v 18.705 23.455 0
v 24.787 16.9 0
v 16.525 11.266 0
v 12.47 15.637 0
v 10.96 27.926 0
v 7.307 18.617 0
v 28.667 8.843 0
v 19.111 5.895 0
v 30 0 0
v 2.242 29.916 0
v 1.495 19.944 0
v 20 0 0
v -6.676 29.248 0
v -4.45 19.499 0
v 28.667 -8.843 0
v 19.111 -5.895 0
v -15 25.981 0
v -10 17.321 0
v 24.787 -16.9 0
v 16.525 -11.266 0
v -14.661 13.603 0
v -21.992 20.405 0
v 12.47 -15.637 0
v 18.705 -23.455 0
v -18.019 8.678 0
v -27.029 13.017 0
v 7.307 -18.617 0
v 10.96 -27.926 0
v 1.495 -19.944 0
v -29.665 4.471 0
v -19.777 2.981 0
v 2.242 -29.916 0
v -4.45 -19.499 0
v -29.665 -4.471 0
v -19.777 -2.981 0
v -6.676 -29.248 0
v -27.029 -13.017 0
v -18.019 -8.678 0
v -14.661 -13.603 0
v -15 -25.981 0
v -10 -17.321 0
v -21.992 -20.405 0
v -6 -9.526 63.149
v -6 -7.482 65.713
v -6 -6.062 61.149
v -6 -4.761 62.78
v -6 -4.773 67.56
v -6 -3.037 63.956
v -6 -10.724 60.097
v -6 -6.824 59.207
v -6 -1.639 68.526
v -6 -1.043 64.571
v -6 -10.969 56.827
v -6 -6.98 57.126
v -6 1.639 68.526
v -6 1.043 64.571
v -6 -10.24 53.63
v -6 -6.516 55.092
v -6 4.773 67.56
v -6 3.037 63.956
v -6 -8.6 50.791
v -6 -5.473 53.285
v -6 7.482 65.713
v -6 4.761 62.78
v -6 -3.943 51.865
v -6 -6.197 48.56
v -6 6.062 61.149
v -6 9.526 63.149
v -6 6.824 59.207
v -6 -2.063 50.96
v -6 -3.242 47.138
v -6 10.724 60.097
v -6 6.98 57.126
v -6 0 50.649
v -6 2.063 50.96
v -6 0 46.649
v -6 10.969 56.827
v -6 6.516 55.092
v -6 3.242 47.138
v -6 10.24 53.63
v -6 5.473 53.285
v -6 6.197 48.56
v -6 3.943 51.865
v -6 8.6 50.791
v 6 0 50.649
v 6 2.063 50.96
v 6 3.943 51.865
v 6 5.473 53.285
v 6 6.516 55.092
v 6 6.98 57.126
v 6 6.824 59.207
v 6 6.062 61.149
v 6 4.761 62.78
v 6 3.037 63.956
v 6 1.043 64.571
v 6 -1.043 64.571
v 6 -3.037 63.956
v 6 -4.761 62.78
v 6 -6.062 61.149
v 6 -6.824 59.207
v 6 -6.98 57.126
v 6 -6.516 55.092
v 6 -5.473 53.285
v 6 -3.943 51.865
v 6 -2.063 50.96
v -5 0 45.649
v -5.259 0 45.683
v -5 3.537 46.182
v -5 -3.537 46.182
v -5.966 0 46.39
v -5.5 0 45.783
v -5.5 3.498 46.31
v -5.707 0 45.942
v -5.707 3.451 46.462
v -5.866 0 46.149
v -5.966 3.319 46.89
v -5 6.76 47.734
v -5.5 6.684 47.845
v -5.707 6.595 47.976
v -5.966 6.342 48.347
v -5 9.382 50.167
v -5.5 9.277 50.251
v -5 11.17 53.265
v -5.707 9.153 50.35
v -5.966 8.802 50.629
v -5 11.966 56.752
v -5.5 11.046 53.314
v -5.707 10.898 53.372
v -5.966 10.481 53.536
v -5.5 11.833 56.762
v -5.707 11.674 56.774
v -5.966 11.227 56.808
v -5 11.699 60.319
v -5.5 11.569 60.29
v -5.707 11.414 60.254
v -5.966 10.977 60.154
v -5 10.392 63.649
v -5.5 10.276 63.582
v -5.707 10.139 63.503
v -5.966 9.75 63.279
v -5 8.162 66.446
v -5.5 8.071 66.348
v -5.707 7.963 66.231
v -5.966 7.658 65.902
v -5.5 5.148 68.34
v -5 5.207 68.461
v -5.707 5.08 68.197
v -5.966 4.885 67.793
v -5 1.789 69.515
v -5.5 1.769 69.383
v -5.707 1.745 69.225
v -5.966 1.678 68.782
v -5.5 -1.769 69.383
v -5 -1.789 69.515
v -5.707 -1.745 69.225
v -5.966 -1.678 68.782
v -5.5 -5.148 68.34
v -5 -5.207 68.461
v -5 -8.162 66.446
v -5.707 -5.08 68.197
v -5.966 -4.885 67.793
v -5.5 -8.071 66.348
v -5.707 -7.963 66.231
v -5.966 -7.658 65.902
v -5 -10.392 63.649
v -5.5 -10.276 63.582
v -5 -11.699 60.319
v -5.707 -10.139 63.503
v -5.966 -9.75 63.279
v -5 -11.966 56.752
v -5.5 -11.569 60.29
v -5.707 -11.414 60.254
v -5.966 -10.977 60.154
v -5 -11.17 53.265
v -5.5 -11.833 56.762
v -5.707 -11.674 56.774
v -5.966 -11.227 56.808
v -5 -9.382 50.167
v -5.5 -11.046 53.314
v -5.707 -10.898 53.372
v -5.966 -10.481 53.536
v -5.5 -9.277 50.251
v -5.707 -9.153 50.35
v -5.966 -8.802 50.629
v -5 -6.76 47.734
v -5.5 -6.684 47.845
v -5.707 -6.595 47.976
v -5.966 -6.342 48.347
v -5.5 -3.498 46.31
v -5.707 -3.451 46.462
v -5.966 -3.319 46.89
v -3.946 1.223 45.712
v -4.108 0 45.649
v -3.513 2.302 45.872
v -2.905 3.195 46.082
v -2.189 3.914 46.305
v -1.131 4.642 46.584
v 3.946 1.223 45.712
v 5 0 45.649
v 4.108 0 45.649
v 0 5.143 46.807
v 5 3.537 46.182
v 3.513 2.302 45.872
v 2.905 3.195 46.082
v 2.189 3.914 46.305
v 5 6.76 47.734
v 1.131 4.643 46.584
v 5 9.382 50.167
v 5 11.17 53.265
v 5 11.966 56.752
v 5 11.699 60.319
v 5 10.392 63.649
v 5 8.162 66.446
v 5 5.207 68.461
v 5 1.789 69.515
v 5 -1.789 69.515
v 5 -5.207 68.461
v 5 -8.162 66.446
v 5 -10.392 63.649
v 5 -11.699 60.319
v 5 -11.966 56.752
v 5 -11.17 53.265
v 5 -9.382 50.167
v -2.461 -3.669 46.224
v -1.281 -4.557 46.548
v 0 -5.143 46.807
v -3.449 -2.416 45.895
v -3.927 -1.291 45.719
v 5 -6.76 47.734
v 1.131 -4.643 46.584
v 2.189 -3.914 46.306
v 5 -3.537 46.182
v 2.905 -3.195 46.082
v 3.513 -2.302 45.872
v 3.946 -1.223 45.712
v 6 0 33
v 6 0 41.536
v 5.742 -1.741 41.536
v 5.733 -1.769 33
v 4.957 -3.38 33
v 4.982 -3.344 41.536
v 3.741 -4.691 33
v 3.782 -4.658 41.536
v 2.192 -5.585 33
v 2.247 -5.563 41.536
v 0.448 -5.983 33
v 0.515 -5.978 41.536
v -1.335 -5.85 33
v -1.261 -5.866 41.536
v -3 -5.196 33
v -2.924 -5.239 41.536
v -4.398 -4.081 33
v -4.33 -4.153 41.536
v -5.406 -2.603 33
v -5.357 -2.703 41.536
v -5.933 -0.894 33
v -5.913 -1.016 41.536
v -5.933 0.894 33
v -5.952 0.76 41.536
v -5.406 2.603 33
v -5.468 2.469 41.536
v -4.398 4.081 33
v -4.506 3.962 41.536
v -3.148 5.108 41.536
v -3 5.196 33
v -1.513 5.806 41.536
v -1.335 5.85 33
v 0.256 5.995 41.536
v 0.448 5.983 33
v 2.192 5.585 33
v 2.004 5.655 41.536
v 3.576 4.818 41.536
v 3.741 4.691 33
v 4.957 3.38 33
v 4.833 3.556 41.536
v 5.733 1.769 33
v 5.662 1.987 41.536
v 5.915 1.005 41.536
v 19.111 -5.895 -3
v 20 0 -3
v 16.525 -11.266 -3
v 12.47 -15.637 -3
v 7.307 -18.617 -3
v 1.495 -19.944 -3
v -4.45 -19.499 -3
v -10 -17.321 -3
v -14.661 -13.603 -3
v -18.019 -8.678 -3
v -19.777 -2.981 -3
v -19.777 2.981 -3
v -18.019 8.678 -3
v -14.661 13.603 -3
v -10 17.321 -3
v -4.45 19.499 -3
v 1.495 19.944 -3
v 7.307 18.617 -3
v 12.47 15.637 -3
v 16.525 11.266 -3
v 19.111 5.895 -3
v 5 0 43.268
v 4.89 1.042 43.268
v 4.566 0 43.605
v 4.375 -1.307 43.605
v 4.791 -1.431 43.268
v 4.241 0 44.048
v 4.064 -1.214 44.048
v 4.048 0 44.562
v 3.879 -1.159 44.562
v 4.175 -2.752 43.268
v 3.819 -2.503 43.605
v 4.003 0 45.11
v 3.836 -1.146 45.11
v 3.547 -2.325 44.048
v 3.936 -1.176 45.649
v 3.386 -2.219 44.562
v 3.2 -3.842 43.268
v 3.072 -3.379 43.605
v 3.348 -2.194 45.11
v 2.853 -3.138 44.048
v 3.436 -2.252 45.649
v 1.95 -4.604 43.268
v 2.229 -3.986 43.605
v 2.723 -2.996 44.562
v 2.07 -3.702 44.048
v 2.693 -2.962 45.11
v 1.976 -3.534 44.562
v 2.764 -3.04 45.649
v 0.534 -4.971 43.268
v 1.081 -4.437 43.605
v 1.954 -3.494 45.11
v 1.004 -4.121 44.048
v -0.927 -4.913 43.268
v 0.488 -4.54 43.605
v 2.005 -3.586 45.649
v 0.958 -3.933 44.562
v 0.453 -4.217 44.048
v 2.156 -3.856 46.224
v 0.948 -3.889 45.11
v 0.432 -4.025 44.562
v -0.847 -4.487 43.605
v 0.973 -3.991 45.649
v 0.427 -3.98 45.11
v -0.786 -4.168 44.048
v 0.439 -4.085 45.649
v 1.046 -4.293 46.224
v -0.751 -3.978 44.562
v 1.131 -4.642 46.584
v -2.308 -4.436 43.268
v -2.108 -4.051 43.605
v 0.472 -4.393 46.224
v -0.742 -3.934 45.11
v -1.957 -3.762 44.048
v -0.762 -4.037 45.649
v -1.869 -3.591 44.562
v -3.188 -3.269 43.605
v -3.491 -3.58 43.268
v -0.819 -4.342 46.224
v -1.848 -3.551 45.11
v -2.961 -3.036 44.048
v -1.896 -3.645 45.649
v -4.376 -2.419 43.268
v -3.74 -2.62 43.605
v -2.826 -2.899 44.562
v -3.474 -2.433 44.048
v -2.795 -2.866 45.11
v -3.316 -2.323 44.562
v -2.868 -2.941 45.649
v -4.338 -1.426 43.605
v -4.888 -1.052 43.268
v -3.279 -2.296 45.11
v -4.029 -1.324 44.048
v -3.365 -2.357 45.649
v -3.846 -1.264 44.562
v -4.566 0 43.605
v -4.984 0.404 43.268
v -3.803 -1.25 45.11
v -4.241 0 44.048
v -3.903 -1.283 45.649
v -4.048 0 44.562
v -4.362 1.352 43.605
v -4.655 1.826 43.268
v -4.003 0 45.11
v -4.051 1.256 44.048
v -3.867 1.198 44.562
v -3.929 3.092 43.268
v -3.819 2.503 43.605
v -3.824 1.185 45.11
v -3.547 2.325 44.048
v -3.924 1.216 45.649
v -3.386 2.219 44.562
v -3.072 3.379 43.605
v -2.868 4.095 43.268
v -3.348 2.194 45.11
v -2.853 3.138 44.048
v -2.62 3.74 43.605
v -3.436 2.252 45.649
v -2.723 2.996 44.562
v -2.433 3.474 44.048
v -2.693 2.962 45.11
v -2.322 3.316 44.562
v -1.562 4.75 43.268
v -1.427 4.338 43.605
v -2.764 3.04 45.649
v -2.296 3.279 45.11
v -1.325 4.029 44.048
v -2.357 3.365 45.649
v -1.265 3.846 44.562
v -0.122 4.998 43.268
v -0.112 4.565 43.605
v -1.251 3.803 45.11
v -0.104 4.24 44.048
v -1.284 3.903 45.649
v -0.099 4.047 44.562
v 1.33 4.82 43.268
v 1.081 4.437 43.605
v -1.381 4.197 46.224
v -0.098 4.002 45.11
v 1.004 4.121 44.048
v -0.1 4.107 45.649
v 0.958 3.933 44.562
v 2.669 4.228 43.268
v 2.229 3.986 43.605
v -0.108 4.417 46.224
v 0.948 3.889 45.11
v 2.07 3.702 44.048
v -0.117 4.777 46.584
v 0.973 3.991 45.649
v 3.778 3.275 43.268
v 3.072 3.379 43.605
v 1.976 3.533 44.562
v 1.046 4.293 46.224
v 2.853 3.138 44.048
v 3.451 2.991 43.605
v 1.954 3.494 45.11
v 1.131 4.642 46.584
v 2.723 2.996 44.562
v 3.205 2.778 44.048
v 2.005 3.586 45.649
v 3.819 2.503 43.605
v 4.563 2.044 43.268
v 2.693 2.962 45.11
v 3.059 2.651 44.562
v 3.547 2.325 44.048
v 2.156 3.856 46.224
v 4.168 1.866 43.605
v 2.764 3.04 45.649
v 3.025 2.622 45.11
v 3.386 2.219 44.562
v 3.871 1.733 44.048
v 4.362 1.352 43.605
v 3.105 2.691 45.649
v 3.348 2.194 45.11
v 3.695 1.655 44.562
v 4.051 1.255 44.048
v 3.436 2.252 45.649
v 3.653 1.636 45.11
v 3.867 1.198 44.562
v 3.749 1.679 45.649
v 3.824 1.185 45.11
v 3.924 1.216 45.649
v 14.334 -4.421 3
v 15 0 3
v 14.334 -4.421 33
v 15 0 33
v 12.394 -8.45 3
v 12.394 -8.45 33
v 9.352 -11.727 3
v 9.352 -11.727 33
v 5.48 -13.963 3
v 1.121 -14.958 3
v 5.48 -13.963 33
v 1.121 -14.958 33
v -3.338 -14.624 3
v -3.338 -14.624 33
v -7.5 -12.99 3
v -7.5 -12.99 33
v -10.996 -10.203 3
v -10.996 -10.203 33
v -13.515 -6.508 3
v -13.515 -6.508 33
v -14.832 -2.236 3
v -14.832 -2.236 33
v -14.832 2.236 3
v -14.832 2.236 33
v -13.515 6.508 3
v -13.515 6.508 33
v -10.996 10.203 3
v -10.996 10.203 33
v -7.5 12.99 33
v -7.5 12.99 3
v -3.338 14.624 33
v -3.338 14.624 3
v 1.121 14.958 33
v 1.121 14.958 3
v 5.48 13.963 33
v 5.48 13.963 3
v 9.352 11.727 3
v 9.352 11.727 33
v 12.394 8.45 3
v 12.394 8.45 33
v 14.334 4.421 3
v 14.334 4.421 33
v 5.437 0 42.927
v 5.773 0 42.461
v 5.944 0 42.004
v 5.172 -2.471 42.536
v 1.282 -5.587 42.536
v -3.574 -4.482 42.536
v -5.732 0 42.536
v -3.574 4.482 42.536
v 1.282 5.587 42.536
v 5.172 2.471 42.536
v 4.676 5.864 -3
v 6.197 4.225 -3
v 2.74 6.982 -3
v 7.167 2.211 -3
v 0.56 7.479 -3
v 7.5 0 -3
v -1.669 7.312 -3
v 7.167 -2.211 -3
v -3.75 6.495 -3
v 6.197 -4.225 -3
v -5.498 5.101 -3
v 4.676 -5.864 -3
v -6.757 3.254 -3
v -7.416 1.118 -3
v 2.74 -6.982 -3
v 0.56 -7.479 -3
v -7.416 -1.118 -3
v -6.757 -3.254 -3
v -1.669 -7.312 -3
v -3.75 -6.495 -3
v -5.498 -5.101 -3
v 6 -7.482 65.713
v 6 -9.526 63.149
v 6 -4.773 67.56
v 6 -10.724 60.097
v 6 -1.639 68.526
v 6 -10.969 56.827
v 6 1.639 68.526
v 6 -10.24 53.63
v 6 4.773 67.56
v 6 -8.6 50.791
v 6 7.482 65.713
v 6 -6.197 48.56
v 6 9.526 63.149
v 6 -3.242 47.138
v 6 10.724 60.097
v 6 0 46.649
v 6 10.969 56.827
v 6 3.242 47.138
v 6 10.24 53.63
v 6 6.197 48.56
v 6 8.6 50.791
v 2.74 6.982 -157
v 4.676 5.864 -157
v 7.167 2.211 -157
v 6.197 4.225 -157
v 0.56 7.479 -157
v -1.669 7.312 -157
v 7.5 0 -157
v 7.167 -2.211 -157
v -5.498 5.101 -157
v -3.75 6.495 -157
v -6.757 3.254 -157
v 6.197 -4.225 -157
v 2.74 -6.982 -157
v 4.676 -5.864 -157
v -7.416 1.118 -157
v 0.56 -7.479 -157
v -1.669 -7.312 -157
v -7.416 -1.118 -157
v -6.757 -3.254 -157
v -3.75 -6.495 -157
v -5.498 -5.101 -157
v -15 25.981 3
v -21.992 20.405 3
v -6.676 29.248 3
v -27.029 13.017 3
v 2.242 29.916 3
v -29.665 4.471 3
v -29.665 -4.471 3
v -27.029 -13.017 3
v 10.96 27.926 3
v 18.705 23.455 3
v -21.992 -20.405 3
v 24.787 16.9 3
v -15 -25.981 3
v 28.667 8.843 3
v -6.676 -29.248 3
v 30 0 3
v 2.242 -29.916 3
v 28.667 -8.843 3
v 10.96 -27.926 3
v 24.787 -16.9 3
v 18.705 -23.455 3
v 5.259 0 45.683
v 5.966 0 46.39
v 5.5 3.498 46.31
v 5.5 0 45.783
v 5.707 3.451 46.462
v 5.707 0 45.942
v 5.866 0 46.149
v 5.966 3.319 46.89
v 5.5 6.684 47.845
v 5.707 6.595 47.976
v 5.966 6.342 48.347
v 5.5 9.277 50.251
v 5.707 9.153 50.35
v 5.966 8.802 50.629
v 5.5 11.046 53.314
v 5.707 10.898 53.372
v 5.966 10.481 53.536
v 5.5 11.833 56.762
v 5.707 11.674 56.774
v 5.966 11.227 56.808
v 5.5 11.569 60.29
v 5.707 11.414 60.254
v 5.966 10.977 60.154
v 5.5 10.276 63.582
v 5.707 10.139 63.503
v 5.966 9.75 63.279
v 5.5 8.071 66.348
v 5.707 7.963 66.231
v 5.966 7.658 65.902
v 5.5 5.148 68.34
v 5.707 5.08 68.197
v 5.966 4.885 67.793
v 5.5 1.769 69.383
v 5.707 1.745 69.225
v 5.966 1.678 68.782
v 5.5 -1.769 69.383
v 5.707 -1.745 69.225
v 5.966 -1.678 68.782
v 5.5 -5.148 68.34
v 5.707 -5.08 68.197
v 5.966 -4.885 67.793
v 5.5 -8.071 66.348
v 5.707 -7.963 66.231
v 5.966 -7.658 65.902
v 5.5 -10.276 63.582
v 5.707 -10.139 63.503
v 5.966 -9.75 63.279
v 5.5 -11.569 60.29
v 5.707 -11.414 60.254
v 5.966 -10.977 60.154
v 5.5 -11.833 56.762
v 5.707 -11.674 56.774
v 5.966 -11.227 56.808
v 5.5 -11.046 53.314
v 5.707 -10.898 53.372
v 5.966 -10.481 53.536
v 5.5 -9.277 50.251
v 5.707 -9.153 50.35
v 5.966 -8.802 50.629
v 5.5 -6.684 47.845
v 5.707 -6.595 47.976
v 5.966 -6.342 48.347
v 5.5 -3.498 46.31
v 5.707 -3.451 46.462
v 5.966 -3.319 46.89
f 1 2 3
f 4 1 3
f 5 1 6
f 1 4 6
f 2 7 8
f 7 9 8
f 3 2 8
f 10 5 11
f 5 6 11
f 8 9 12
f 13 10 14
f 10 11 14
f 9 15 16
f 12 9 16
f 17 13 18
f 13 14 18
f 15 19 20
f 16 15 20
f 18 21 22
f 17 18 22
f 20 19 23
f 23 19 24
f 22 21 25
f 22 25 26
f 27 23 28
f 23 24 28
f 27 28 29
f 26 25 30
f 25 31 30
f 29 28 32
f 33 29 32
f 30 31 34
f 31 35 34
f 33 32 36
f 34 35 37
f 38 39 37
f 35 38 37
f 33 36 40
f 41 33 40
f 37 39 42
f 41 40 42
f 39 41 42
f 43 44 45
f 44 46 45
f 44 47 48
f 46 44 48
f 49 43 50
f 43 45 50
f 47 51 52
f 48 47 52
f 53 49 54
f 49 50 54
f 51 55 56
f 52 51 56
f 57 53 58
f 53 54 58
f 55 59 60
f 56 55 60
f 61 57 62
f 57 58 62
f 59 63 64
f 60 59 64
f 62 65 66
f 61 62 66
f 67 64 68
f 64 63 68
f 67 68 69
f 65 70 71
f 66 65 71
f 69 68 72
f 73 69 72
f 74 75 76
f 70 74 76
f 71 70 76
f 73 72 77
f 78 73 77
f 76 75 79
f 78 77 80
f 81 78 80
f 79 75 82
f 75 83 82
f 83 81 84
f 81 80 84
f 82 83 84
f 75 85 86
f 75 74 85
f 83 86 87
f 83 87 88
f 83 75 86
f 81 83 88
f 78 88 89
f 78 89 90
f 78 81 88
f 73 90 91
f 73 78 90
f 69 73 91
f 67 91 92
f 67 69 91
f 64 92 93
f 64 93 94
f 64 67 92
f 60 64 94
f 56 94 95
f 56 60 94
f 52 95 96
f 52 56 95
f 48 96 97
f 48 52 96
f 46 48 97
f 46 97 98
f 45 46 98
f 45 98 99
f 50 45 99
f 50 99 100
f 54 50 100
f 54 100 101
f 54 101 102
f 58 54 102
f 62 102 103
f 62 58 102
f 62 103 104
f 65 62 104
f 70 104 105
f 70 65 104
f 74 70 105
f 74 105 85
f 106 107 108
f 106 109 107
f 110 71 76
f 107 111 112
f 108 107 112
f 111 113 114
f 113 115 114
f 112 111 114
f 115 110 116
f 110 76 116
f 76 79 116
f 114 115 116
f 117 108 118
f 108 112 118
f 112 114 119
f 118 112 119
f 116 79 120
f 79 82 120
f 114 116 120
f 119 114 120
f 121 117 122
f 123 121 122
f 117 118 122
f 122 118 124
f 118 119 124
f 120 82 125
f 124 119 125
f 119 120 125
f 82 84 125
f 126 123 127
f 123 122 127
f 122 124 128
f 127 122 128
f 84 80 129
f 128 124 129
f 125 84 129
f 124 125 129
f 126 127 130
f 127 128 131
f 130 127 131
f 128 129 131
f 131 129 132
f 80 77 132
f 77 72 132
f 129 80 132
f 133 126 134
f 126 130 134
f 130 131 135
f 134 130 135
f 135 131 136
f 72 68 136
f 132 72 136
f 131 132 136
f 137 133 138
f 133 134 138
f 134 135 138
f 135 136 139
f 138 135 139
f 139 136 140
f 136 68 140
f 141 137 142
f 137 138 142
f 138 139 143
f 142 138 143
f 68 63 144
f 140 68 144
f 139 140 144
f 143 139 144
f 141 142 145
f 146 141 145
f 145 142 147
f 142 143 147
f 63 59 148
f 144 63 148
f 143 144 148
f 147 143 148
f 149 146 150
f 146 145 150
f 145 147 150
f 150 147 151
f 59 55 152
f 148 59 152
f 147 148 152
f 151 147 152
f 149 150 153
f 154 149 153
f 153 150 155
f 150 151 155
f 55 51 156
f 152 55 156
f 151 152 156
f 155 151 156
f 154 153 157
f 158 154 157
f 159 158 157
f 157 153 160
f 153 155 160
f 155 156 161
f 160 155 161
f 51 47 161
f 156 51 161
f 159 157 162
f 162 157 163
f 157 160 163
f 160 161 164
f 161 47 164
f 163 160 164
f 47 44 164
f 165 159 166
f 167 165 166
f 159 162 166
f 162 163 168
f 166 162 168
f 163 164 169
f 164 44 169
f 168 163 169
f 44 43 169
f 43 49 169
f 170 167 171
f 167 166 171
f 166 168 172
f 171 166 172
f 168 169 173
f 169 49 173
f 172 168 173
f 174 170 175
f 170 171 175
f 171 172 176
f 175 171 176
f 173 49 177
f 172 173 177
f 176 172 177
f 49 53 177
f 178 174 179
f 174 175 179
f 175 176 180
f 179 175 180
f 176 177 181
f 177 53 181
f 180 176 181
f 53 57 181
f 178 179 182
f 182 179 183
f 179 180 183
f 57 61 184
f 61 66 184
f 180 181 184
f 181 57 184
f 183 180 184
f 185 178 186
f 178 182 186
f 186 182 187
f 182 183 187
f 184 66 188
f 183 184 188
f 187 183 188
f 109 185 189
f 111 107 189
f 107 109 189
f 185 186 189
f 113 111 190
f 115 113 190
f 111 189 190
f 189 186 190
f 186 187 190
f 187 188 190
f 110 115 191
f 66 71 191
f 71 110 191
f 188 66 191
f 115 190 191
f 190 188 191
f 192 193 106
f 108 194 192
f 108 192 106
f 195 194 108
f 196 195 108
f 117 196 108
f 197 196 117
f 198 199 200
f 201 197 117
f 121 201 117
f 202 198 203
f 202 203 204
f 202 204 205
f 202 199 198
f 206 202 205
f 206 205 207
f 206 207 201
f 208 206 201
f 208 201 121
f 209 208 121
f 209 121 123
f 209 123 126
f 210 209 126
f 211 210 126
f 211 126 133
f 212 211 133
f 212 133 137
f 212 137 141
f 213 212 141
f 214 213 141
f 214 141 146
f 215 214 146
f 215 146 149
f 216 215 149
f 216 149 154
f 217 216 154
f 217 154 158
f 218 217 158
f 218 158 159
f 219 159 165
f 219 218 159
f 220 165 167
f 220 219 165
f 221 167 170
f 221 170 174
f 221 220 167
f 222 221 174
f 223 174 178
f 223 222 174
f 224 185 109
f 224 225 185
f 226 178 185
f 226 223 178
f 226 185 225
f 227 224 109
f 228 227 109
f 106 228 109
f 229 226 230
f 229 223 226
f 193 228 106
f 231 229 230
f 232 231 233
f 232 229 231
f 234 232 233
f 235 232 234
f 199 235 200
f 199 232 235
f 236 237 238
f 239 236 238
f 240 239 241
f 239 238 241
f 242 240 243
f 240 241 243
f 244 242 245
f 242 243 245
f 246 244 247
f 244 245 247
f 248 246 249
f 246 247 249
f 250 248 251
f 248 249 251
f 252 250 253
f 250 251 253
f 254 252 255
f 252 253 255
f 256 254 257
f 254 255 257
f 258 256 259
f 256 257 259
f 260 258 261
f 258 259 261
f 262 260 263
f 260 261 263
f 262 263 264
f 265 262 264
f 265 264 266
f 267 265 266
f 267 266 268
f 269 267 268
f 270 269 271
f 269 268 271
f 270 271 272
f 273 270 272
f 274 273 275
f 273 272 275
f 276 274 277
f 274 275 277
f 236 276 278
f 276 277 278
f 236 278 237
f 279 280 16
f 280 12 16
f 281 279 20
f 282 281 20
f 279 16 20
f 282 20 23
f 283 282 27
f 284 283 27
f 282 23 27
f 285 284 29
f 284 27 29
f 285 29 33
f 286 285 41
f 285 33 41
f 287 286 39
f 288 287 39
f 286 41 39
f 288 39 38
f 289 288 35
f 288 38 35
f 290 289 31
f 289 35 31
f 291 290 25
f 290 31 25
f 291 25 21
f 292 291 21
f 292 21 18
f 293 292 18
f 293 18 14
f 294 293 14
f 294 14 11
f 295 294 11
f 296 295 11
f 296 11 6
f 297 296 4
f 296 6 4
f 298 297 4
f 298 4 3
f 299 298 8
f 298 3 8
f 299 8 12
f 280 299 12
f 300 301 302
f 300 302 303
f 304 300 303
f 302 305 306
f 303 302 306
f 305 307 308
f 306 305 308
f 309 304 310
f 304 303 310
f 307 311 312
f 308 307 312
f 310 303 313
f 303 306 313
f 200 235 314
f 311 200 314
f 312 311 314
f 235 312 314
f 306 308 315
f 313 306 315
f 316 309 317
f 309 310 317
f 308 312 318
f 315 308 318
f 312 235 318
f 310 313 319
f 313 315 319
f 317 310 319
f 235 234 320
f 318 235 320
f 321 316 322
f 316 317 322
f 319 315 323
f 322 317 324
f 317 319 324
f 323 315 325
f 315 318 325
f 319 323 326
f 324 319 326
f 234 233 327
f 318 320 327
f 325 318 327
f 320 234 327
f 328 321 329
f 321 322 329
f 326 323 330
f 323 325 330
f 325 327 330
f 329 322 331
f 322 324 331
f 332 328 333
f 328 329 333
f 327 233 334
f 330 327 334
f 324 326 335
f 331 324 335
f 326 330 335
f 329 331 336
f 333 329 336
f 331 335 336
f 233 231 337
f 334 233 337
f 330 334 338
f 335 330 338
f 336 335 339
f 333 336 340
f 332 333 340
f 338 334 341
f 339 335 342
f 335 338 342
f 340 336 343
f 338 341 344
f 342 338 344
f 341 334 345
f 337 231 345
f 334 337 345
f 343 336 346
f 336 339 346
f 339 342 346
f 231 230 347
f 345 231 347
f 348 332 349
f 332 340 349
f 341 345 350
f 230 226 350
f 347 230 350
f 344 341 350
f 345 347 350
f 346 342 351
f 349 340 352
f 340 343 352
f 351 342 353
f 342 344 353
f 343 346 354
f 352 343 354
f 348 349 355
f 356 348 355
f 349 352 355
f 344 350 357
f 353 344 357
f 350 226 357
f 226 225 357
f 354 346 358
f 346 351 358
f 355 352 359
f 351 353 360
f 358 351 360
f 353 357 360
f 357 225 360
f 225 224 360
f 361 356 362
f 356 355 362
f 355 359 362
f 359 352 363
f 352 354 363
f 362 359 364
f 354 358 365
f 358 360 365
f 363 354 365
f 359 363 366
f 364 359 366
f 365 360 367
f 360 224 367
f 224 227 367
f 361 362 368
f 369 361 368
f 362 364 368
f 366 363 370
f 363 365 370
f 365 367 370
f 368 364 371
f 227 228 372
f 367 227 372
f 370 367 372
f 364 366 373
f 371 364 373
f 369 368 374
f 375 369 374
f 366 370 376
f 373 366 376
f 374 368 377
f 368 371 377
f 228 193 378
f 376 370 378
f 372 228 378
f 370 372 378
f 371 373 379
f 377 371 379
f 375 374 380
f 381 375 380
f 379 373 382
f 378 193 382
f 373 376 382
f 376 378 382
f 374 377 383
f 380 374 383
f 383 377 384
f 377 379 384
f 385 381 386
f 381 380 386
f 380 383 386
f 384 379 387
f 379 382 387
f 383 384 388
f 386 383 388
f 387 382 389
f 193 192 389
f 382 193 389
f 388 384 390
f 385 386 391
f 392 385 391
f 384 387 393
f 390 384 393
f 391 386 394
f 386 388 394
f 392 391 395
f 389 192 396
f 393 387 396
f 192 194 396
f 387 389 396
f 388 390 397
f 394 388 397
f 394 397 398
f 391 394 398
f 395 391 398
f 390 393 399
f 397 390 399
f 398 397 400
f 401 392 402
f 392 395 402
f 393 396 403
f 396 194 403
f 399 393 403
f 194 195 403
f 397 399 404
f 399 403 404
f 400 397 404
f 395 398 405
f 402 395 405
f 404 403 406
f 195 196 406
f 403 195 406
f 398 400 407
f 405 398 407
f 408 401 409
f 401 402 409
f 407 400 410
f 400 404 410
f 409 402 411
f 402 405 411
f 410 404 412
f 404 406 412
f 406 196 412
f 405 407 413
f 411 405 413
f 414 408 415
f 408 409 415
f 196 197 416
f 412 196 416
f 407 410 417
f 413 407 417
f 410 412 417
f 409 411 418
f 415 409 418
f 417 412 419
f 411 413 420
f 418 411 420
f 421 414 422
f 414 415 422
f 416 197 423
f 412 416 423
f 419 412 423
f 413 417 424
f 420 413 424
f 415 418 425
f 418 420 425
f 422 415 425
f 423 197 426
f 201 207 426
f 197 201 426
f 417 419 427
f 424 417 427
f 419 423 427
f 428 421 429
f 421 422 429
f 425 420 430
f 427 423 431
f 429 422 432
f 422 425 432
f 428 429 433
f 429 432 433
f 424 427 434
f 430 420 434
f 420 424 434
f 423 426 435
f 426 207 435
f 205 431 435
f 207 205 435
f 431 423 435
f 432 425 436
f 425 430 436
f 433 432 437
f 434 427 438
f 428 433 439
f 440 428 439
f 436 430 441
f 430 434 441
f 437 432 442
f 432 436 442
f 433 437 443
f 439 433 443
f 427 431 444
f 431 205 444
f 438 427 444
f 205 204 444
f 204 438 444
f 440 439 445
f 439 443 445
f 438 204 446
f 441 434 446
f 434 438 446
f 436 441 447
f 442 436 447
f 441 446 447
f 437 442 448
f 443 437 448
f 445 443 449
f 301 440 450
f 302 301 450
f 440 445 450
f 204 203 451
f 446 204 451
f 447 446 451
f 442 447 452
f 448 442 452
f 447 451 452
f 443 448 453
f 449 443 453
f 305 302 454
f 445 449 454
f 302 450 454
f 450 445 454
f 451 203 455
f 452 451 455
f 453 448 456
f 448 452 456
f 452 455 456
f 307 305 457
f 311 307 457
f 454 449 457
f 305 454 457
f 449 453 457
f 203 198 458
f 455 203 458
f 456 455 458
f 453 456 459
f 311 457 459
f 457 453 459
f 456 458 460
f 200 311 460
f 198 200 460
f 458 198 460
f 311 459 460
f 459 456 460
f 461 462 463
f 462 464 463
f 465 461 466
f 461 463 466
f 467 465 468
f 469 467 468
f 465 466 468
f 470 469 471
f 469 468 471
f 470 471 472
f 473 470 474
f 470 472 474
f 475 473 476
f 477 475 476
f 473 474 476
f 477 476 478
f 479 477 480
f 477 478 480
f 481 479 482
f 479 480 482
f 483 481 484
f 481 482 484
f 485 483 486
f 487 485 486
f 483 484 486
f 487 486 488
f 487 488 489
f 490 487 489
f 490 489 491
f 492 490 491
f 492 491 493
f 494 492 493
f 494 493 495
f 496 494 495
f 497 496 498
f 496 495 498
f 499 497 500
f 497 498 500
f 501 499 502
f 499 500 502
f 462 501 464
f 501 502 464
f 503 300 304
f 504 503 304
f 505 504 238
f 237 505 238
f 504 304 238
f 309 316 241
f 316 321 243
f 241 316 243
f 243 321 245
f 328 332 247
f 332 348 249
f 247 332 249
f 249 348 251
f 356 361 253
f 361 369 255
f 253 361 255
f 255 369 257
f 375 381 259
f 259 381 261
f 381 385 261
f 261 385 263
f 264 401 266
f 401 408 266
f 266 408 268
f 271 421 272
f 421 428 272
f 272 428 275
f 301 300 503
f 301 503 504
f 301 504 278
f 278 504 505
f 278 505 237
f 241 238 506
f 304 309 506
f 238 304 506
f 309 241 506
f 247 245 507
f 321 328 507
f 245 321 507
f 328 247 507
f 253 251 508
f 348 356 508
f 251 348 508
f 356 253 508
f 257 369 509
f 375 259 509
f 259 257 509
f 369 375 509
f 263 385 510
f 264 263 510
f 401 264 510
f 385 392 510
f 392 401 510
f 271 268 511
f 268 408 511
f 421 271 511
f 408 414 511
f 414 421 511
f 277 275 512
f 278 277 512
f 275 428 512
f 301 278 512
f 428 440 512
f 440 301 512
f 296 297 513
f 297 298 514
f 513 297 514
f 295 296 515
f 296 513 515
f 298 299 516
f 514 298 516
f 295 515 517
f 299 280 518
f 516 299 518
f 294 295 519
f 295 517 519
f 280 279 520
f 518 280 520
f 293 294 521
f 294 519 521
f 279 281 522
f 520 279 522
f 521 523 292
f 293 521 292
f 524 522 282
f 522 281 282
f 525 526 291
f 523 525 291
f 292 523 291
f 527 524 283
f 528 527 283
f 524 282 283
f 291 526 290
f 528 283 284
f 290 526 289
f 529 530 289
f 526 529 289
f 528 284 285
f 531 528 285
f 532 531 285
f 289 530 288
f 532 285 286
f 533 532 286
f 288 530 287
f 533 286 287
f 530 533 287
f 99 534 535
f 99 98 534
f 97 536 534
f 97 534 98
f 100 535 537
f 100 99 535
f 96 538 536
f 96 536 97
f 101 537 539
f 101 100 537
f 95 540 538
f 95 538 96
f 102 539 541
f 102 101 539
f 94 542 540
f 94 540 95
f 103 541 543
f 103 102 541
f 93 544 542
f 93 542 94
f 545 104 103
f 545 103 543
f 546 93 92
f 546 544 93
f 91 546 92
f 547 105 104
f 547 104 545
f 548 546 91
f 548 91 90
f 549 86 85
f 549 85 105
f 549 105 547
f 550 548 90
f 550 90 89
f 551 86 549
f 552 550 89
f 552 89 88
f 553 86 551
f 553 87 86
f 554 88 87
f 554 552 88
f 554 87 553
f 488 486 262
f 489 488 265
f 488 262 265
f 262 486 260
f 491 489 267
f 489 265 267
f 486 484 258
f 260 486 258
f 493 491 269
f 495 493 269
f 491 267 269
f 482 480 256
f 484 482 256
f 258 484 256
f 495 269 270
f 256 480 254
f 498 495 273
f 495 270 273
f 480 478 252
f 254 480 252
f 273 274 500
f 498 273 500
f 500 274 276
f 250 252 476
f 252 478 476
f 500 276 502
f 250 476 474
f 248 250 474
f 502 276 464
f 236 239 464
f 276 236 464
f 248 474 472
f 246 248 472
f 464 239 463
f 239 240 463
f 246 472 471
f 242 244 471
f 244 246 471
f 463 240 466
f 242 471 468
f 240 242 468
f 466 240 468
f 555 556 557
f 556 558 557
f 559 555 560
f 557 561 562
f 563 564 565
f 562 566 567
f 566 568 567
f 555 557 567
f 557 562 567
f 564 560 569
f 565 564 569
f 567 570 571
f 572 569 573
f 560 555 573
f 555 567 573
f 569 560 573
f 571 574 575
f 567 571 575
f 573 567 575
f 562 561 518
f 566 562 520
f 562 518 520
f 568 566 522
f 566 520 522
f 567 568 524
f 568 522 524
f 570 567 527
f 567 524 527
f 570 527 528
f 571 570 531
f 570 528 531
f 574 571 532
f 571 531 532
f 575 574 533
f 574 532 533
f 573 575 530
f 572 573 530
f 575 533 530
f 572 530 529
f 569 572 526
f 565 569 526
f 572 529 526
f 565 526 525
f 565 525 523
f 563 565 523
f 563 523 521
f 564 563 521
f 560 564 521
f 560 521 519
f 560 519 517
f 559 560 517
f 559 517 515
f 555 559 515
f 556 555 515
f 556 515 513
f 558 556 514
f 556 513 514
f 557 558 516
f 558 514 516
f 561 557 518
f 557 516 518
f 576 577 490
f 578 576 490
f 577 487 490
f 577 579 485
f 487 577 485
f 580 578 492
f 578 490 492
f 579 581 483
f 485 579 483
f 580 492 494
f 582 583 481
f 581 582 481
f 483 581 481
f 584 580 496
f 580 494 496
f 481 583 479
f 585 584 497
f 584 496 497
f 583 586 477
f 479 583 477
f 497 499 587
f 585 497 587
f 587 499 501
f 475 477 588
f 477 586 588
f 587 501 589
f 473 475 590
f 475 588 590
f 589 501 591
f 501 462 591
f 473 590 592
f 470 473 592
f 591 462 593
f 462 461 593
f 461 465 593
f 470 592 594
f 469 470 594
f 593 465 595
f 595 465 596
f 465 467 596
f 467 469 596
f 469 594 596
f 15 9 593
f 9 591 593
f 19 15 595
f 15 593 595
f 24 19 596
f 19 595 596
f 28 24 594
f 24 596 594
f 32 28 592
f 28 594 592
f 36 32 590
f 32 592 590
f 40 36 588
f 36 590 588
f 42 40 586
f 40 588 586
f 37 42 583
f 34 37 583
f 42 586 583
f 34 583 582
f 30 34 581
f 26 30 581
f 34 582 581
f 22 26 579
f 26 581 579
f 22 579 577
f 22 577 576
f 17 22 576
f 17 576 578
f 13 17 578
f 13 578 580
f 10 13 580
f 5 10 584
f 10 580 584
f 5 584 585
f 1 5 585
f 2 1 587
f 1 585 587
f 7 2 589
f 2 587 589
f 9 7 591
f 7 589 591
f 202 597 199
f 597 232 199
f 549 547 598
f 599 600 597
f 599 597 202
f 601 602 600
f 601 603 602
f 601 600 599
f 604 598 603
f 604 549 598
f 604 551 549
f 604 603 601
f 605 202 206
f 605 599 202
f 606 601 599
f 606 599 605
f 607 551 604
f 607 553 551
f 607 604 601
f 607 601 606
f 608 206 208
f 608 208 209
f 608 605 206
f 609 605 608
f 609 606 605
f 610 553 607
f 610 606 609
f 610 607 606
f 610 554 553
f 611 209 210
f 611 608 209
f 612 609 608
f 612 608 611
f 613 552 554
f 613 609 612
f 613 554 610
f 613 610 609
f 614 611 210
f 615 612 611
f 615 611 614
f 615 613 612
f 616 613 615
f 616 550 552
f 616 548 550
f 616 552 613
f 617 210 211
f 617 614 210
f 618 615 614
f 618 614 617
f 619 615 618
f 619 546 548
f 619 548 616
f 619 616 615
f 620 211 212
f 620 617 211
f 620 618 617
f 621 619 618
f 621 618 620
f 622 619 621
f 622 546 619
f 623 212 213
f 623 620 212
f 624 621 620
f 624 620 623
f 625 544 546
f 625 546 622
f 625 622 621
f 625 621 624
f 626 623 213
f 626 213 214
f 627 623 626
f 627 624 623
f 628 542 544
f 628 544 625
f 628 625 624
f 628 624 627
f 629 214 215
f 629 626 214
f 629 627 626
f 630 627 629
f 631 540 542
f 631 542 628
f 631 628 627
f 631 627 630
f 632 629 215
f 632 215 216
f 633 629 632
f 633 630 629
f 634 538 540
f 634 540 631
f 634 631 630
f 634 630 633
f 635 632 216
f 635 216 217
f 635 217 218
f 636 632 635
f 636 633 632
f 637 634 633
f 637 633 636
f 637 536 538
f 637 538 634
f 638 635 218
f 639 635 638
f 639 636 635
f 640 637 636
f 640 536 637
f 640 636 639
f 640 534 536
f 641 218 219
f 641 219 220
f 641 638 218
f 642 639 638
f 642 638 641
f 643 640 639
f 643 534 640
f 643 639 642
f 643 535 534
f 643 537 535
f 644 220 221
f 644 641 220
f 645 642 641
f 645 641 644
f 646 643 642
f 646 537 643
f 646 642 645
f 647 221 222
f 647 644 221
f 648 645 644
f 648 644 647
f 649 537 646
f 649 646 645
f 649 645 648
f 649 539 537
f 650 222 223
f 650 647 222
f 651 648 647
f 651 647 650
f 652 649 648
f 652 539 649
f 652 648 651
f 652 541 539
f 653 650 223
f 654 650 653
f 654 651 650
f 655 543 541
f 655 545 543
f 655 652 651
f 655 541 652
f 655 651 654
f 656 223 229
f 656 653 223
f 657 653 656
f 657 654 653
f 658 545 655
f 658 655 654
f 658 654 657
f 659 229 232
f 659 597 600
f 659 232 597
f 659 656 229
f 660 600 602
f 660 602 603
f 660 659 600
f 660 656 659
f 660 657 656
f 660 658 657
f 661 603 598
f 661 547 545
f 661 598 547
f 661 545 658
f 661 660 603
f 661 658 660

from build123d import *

# Parameters (mm, degrees)
SKETCH2_4_R         = 7
BOSS_EXTRUDE1_DEPTH = 6
FILLET1_R           = 1
FILLET2_R           = 2


with BuildPart() as part:
    # Sketch1 → Revolve1 (revolve)
    with BuildSketch(Plane.YZ):
        Polygon((6, 43), (0, 43), (0, -157), (7.5, -157), (7.5, -3), (20, -3), (20, 0), (30, 0), (30, 3), (15, 3), (15, 33), (6, 33), align=None)
    revolve(axis=Axis((0, 0, 49.693213244), (0, 0, -1)))

    # Sketch2 → Revolve2 (revolve)
    with BuildSketch(Plane.YZ):
        with BuildLine():
            ThreePointArc((5.142857143, 46.807015806), (2.63579798, 45.942165309), (0, 45.649110641))
            Line((0, 45.649110641), (0, 43))
            Line((0, 43), (6, 43))
            ThreePointArc((6, 43), (4.048842445, 44.560700337), (5.142857143, 46.807015806))
        make_face()
    revolve(axis=Axis((0, 0, 57.649110641), (0, 0, -1)))

    # Sketch2<4> → Boss-Extrude1 (add, symmetric)
    with BuildSketch(Plane.YZ):
        with BuildLine():
            ThreePointArc((-5.142857143, 46.807015806), (-2.63579798, 45.942165309), (0, 45.649110641))
            ThreePointArc((0, 45.649110641), (2.63579798, 45.942165309), (5.142857143, 46.807015806))
            ThreePointArc((5.142857143, 46.807015806), (10.141851057, 51.234840835), (12, 57.649110641))
            ThreePointArc((12, 57.649110641), (-6.414269806, 67.790961697), (-5.142857143, 46.807015806))
        make_face()
        with Locations((0, 57.649110641)):
            Circle(SKETCH2_4_R, mode=Mode.SUBTRACT)
    extrude(amount=BOSS_EXTRUDE1_DEPTH, both=True)

    # Fillet1
    fillet1_edges = [part.edges().sort_by_distance(p)[0] for p in [
        (-6, -2.63579798, 45.942165309),
        (6, 2.63579798, 45.942165309),
    ]]
    fillet(fillet1_edges, radius=FILLET1_R)

    # Fillet2
    fillet2_edges = [part.edges().sort_by_distance(p)[0] for p in [
        (0, -6, 43),
    ]]
    fillet(fillet2_edges, radius=FILLET2_R)


solid = part.part
